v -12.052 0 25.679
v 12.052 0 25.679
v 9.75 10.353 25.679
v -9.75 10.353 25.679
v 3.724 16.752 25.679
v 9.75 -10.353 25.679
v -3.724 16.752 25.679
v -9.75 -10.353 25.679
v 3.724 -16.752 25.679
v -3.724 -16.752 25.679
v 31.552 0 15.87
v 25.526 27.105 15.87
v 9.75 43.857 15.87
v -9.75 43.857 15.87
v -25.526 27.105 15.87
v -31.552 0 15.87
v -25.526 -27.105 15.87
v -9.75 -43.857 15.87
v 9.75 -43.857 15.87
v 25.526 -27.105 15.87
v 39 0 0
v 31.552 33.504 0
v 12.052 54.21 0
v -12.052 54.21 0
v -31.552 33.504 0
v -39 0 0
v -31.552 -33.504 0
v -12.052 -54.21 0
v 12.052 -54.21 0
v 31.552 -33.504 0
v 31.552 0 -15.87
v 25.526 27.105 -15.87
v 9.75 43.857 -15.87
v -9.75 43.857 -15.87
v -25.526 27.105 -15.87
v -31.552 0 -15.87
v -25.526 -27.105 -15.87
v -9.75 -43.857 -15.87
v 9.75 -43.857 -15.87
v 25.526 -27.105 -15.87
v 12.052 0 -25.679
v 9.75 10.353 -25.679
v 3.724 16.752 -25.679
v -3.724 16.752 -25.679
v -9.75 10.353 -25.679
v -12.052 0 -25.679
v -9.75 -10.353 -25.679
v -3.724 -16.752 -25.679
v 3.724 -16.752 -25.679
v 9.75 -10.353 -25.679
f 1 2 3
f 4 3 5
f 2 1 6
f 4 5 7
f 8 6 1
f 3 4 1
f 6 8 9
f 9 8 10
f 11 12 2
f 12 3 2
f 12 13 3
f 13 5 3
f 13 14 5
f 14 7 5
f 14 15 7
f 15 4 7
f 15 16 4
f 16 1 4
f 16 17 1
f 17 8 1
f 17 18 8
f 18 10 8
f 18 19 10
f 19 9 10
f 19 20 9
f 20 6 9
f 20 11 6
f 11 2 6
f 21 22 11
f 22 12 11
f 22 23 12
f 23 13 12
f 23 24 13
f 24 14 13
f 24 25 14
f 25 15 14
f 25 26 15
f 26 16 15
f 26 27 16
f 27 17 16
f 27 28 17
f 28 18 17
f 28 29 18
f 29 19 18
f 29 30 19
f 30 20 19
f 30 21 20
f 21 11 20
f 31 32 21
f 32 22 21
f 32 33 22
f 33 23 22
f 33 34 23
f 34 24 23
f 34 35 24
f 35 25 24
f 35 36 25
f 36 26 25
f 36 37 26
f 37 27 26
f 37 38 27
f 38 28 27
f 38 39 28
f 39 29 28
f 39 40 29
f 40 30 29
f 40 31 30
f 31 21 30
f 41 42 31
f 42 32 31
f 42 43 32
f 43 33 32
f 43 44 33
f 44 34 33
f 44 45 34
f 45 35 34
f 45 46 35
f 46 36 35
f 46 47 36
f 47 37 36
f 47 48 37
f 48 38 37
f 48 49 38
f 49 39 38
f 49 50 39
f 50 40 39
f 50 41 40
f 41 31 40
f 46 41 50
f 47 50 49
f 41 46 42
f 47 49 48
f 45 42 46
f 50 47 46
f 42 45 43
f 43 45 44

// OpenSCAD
// Generated by SolidPython 1.0.1 on 2020-07-29 00:46:51


scale(v = [13, 19, 9]) {
	sphere(r = 3);
}
/***********************************************
*********      SolidPython code:      **********
************************************************
 
# import packages: SolidPython
from solid import *
from solid.utils import *
from itertools import chain, combinations, permutations


class Resize:

    def __init__(self, scad_file):
        self.scad_file = scad_file
        #self.scad_file = import_scad(scad_file)
        # cone/cylinder param:
        self.r1 = 0
        self.r2 = 0
        self.h = 0
        # rectangular prism param:
        self.w = 0
        self.l = 0
        # ellipse param:
        self.r = 0

    # import OpenScad code (file name corresponds to shape)


    # classify shape + parameters
    def assign(self, param1, param2, param3):
        if self.scad_file == 'cone.scad':
            self.r1 = param1
            self.r2 = param2
            self.h = param3
        elif self.scad_file == 'cylinder.scad':
            self.r1 = param1
            self.r2 = param2
            self.h = param3
        elif self.scad_file == 'rectangularPrism.scad':
            self.h = param1
            self.l = param2
            self.w = param3
        else:
            self.r = param1
            self.h = param2

    # resize parameters
    def iterate(self):
        x = range(3, 20, 2)
        i = 1
        if self.scad_file == 'cone.scad':
            tempList = list(permutations(x, 2))
            for temp in tempList:
                param1 = temp[0]
                param2 = temp[1]
                filepath = 'produced_scad_files/' + 'cone' + str(param1) + '_' + str(param2) + '_' + '.scad'
                scad_render_to_file(cylinder(h=param1, r1=param2, r2=0), filepath)

        elif self.scad_file == 'cylinder.scad':
            tempList = list(permutations(x, 3))
            for temp in tempList:
                param1 = temp[0]
                param2 = temp[1]
                filepath = 'produced_scad_files/' + 'cylinder' + str(param1) + '_' + str(param2) + '_' + '.scad'
                scad_render_to_file(cylinder(h=param1, r1=param2, r2=param2), filepath)

        elif self.scad_file == 'rectangularPrism.scad':
            tempList = list(permutations(x, 3))
            for temp in tempList:
                param1 = temp[0]
                param2 = temp[1]
                param3 = temp[2]
                filepath = 'produced_scad_files/' + 'rectangularPrism' + str(param1) + '_' + str(param2) + '_' + str(
                    param3) + '.scad'
                scad_render_to_file(cube(size=(param1, param2, param3)), filepath)

        elif self.scad_file == 'ellipse.scad':
            tempList = list(permutations(x, 4))
            for temp in tempList:
                param1 = temp[0]
                param2 = temp[1]
                param3 = temp[2]
                param4 = temp[3]
                filepath = 'produced_scad_files/' + 'ellipse' + str(param1) + '_' + str(param2) + '_' + str(param3) + '_' + str(param4) + '.scad'
                scad_render_to_file(scale([param1, param2, param3])(sphere(r=param4)), filepath)

    def render_to_scadfile(self):
        scad_render_to_file(scad, 'example.scad') 
 
************************************************/
